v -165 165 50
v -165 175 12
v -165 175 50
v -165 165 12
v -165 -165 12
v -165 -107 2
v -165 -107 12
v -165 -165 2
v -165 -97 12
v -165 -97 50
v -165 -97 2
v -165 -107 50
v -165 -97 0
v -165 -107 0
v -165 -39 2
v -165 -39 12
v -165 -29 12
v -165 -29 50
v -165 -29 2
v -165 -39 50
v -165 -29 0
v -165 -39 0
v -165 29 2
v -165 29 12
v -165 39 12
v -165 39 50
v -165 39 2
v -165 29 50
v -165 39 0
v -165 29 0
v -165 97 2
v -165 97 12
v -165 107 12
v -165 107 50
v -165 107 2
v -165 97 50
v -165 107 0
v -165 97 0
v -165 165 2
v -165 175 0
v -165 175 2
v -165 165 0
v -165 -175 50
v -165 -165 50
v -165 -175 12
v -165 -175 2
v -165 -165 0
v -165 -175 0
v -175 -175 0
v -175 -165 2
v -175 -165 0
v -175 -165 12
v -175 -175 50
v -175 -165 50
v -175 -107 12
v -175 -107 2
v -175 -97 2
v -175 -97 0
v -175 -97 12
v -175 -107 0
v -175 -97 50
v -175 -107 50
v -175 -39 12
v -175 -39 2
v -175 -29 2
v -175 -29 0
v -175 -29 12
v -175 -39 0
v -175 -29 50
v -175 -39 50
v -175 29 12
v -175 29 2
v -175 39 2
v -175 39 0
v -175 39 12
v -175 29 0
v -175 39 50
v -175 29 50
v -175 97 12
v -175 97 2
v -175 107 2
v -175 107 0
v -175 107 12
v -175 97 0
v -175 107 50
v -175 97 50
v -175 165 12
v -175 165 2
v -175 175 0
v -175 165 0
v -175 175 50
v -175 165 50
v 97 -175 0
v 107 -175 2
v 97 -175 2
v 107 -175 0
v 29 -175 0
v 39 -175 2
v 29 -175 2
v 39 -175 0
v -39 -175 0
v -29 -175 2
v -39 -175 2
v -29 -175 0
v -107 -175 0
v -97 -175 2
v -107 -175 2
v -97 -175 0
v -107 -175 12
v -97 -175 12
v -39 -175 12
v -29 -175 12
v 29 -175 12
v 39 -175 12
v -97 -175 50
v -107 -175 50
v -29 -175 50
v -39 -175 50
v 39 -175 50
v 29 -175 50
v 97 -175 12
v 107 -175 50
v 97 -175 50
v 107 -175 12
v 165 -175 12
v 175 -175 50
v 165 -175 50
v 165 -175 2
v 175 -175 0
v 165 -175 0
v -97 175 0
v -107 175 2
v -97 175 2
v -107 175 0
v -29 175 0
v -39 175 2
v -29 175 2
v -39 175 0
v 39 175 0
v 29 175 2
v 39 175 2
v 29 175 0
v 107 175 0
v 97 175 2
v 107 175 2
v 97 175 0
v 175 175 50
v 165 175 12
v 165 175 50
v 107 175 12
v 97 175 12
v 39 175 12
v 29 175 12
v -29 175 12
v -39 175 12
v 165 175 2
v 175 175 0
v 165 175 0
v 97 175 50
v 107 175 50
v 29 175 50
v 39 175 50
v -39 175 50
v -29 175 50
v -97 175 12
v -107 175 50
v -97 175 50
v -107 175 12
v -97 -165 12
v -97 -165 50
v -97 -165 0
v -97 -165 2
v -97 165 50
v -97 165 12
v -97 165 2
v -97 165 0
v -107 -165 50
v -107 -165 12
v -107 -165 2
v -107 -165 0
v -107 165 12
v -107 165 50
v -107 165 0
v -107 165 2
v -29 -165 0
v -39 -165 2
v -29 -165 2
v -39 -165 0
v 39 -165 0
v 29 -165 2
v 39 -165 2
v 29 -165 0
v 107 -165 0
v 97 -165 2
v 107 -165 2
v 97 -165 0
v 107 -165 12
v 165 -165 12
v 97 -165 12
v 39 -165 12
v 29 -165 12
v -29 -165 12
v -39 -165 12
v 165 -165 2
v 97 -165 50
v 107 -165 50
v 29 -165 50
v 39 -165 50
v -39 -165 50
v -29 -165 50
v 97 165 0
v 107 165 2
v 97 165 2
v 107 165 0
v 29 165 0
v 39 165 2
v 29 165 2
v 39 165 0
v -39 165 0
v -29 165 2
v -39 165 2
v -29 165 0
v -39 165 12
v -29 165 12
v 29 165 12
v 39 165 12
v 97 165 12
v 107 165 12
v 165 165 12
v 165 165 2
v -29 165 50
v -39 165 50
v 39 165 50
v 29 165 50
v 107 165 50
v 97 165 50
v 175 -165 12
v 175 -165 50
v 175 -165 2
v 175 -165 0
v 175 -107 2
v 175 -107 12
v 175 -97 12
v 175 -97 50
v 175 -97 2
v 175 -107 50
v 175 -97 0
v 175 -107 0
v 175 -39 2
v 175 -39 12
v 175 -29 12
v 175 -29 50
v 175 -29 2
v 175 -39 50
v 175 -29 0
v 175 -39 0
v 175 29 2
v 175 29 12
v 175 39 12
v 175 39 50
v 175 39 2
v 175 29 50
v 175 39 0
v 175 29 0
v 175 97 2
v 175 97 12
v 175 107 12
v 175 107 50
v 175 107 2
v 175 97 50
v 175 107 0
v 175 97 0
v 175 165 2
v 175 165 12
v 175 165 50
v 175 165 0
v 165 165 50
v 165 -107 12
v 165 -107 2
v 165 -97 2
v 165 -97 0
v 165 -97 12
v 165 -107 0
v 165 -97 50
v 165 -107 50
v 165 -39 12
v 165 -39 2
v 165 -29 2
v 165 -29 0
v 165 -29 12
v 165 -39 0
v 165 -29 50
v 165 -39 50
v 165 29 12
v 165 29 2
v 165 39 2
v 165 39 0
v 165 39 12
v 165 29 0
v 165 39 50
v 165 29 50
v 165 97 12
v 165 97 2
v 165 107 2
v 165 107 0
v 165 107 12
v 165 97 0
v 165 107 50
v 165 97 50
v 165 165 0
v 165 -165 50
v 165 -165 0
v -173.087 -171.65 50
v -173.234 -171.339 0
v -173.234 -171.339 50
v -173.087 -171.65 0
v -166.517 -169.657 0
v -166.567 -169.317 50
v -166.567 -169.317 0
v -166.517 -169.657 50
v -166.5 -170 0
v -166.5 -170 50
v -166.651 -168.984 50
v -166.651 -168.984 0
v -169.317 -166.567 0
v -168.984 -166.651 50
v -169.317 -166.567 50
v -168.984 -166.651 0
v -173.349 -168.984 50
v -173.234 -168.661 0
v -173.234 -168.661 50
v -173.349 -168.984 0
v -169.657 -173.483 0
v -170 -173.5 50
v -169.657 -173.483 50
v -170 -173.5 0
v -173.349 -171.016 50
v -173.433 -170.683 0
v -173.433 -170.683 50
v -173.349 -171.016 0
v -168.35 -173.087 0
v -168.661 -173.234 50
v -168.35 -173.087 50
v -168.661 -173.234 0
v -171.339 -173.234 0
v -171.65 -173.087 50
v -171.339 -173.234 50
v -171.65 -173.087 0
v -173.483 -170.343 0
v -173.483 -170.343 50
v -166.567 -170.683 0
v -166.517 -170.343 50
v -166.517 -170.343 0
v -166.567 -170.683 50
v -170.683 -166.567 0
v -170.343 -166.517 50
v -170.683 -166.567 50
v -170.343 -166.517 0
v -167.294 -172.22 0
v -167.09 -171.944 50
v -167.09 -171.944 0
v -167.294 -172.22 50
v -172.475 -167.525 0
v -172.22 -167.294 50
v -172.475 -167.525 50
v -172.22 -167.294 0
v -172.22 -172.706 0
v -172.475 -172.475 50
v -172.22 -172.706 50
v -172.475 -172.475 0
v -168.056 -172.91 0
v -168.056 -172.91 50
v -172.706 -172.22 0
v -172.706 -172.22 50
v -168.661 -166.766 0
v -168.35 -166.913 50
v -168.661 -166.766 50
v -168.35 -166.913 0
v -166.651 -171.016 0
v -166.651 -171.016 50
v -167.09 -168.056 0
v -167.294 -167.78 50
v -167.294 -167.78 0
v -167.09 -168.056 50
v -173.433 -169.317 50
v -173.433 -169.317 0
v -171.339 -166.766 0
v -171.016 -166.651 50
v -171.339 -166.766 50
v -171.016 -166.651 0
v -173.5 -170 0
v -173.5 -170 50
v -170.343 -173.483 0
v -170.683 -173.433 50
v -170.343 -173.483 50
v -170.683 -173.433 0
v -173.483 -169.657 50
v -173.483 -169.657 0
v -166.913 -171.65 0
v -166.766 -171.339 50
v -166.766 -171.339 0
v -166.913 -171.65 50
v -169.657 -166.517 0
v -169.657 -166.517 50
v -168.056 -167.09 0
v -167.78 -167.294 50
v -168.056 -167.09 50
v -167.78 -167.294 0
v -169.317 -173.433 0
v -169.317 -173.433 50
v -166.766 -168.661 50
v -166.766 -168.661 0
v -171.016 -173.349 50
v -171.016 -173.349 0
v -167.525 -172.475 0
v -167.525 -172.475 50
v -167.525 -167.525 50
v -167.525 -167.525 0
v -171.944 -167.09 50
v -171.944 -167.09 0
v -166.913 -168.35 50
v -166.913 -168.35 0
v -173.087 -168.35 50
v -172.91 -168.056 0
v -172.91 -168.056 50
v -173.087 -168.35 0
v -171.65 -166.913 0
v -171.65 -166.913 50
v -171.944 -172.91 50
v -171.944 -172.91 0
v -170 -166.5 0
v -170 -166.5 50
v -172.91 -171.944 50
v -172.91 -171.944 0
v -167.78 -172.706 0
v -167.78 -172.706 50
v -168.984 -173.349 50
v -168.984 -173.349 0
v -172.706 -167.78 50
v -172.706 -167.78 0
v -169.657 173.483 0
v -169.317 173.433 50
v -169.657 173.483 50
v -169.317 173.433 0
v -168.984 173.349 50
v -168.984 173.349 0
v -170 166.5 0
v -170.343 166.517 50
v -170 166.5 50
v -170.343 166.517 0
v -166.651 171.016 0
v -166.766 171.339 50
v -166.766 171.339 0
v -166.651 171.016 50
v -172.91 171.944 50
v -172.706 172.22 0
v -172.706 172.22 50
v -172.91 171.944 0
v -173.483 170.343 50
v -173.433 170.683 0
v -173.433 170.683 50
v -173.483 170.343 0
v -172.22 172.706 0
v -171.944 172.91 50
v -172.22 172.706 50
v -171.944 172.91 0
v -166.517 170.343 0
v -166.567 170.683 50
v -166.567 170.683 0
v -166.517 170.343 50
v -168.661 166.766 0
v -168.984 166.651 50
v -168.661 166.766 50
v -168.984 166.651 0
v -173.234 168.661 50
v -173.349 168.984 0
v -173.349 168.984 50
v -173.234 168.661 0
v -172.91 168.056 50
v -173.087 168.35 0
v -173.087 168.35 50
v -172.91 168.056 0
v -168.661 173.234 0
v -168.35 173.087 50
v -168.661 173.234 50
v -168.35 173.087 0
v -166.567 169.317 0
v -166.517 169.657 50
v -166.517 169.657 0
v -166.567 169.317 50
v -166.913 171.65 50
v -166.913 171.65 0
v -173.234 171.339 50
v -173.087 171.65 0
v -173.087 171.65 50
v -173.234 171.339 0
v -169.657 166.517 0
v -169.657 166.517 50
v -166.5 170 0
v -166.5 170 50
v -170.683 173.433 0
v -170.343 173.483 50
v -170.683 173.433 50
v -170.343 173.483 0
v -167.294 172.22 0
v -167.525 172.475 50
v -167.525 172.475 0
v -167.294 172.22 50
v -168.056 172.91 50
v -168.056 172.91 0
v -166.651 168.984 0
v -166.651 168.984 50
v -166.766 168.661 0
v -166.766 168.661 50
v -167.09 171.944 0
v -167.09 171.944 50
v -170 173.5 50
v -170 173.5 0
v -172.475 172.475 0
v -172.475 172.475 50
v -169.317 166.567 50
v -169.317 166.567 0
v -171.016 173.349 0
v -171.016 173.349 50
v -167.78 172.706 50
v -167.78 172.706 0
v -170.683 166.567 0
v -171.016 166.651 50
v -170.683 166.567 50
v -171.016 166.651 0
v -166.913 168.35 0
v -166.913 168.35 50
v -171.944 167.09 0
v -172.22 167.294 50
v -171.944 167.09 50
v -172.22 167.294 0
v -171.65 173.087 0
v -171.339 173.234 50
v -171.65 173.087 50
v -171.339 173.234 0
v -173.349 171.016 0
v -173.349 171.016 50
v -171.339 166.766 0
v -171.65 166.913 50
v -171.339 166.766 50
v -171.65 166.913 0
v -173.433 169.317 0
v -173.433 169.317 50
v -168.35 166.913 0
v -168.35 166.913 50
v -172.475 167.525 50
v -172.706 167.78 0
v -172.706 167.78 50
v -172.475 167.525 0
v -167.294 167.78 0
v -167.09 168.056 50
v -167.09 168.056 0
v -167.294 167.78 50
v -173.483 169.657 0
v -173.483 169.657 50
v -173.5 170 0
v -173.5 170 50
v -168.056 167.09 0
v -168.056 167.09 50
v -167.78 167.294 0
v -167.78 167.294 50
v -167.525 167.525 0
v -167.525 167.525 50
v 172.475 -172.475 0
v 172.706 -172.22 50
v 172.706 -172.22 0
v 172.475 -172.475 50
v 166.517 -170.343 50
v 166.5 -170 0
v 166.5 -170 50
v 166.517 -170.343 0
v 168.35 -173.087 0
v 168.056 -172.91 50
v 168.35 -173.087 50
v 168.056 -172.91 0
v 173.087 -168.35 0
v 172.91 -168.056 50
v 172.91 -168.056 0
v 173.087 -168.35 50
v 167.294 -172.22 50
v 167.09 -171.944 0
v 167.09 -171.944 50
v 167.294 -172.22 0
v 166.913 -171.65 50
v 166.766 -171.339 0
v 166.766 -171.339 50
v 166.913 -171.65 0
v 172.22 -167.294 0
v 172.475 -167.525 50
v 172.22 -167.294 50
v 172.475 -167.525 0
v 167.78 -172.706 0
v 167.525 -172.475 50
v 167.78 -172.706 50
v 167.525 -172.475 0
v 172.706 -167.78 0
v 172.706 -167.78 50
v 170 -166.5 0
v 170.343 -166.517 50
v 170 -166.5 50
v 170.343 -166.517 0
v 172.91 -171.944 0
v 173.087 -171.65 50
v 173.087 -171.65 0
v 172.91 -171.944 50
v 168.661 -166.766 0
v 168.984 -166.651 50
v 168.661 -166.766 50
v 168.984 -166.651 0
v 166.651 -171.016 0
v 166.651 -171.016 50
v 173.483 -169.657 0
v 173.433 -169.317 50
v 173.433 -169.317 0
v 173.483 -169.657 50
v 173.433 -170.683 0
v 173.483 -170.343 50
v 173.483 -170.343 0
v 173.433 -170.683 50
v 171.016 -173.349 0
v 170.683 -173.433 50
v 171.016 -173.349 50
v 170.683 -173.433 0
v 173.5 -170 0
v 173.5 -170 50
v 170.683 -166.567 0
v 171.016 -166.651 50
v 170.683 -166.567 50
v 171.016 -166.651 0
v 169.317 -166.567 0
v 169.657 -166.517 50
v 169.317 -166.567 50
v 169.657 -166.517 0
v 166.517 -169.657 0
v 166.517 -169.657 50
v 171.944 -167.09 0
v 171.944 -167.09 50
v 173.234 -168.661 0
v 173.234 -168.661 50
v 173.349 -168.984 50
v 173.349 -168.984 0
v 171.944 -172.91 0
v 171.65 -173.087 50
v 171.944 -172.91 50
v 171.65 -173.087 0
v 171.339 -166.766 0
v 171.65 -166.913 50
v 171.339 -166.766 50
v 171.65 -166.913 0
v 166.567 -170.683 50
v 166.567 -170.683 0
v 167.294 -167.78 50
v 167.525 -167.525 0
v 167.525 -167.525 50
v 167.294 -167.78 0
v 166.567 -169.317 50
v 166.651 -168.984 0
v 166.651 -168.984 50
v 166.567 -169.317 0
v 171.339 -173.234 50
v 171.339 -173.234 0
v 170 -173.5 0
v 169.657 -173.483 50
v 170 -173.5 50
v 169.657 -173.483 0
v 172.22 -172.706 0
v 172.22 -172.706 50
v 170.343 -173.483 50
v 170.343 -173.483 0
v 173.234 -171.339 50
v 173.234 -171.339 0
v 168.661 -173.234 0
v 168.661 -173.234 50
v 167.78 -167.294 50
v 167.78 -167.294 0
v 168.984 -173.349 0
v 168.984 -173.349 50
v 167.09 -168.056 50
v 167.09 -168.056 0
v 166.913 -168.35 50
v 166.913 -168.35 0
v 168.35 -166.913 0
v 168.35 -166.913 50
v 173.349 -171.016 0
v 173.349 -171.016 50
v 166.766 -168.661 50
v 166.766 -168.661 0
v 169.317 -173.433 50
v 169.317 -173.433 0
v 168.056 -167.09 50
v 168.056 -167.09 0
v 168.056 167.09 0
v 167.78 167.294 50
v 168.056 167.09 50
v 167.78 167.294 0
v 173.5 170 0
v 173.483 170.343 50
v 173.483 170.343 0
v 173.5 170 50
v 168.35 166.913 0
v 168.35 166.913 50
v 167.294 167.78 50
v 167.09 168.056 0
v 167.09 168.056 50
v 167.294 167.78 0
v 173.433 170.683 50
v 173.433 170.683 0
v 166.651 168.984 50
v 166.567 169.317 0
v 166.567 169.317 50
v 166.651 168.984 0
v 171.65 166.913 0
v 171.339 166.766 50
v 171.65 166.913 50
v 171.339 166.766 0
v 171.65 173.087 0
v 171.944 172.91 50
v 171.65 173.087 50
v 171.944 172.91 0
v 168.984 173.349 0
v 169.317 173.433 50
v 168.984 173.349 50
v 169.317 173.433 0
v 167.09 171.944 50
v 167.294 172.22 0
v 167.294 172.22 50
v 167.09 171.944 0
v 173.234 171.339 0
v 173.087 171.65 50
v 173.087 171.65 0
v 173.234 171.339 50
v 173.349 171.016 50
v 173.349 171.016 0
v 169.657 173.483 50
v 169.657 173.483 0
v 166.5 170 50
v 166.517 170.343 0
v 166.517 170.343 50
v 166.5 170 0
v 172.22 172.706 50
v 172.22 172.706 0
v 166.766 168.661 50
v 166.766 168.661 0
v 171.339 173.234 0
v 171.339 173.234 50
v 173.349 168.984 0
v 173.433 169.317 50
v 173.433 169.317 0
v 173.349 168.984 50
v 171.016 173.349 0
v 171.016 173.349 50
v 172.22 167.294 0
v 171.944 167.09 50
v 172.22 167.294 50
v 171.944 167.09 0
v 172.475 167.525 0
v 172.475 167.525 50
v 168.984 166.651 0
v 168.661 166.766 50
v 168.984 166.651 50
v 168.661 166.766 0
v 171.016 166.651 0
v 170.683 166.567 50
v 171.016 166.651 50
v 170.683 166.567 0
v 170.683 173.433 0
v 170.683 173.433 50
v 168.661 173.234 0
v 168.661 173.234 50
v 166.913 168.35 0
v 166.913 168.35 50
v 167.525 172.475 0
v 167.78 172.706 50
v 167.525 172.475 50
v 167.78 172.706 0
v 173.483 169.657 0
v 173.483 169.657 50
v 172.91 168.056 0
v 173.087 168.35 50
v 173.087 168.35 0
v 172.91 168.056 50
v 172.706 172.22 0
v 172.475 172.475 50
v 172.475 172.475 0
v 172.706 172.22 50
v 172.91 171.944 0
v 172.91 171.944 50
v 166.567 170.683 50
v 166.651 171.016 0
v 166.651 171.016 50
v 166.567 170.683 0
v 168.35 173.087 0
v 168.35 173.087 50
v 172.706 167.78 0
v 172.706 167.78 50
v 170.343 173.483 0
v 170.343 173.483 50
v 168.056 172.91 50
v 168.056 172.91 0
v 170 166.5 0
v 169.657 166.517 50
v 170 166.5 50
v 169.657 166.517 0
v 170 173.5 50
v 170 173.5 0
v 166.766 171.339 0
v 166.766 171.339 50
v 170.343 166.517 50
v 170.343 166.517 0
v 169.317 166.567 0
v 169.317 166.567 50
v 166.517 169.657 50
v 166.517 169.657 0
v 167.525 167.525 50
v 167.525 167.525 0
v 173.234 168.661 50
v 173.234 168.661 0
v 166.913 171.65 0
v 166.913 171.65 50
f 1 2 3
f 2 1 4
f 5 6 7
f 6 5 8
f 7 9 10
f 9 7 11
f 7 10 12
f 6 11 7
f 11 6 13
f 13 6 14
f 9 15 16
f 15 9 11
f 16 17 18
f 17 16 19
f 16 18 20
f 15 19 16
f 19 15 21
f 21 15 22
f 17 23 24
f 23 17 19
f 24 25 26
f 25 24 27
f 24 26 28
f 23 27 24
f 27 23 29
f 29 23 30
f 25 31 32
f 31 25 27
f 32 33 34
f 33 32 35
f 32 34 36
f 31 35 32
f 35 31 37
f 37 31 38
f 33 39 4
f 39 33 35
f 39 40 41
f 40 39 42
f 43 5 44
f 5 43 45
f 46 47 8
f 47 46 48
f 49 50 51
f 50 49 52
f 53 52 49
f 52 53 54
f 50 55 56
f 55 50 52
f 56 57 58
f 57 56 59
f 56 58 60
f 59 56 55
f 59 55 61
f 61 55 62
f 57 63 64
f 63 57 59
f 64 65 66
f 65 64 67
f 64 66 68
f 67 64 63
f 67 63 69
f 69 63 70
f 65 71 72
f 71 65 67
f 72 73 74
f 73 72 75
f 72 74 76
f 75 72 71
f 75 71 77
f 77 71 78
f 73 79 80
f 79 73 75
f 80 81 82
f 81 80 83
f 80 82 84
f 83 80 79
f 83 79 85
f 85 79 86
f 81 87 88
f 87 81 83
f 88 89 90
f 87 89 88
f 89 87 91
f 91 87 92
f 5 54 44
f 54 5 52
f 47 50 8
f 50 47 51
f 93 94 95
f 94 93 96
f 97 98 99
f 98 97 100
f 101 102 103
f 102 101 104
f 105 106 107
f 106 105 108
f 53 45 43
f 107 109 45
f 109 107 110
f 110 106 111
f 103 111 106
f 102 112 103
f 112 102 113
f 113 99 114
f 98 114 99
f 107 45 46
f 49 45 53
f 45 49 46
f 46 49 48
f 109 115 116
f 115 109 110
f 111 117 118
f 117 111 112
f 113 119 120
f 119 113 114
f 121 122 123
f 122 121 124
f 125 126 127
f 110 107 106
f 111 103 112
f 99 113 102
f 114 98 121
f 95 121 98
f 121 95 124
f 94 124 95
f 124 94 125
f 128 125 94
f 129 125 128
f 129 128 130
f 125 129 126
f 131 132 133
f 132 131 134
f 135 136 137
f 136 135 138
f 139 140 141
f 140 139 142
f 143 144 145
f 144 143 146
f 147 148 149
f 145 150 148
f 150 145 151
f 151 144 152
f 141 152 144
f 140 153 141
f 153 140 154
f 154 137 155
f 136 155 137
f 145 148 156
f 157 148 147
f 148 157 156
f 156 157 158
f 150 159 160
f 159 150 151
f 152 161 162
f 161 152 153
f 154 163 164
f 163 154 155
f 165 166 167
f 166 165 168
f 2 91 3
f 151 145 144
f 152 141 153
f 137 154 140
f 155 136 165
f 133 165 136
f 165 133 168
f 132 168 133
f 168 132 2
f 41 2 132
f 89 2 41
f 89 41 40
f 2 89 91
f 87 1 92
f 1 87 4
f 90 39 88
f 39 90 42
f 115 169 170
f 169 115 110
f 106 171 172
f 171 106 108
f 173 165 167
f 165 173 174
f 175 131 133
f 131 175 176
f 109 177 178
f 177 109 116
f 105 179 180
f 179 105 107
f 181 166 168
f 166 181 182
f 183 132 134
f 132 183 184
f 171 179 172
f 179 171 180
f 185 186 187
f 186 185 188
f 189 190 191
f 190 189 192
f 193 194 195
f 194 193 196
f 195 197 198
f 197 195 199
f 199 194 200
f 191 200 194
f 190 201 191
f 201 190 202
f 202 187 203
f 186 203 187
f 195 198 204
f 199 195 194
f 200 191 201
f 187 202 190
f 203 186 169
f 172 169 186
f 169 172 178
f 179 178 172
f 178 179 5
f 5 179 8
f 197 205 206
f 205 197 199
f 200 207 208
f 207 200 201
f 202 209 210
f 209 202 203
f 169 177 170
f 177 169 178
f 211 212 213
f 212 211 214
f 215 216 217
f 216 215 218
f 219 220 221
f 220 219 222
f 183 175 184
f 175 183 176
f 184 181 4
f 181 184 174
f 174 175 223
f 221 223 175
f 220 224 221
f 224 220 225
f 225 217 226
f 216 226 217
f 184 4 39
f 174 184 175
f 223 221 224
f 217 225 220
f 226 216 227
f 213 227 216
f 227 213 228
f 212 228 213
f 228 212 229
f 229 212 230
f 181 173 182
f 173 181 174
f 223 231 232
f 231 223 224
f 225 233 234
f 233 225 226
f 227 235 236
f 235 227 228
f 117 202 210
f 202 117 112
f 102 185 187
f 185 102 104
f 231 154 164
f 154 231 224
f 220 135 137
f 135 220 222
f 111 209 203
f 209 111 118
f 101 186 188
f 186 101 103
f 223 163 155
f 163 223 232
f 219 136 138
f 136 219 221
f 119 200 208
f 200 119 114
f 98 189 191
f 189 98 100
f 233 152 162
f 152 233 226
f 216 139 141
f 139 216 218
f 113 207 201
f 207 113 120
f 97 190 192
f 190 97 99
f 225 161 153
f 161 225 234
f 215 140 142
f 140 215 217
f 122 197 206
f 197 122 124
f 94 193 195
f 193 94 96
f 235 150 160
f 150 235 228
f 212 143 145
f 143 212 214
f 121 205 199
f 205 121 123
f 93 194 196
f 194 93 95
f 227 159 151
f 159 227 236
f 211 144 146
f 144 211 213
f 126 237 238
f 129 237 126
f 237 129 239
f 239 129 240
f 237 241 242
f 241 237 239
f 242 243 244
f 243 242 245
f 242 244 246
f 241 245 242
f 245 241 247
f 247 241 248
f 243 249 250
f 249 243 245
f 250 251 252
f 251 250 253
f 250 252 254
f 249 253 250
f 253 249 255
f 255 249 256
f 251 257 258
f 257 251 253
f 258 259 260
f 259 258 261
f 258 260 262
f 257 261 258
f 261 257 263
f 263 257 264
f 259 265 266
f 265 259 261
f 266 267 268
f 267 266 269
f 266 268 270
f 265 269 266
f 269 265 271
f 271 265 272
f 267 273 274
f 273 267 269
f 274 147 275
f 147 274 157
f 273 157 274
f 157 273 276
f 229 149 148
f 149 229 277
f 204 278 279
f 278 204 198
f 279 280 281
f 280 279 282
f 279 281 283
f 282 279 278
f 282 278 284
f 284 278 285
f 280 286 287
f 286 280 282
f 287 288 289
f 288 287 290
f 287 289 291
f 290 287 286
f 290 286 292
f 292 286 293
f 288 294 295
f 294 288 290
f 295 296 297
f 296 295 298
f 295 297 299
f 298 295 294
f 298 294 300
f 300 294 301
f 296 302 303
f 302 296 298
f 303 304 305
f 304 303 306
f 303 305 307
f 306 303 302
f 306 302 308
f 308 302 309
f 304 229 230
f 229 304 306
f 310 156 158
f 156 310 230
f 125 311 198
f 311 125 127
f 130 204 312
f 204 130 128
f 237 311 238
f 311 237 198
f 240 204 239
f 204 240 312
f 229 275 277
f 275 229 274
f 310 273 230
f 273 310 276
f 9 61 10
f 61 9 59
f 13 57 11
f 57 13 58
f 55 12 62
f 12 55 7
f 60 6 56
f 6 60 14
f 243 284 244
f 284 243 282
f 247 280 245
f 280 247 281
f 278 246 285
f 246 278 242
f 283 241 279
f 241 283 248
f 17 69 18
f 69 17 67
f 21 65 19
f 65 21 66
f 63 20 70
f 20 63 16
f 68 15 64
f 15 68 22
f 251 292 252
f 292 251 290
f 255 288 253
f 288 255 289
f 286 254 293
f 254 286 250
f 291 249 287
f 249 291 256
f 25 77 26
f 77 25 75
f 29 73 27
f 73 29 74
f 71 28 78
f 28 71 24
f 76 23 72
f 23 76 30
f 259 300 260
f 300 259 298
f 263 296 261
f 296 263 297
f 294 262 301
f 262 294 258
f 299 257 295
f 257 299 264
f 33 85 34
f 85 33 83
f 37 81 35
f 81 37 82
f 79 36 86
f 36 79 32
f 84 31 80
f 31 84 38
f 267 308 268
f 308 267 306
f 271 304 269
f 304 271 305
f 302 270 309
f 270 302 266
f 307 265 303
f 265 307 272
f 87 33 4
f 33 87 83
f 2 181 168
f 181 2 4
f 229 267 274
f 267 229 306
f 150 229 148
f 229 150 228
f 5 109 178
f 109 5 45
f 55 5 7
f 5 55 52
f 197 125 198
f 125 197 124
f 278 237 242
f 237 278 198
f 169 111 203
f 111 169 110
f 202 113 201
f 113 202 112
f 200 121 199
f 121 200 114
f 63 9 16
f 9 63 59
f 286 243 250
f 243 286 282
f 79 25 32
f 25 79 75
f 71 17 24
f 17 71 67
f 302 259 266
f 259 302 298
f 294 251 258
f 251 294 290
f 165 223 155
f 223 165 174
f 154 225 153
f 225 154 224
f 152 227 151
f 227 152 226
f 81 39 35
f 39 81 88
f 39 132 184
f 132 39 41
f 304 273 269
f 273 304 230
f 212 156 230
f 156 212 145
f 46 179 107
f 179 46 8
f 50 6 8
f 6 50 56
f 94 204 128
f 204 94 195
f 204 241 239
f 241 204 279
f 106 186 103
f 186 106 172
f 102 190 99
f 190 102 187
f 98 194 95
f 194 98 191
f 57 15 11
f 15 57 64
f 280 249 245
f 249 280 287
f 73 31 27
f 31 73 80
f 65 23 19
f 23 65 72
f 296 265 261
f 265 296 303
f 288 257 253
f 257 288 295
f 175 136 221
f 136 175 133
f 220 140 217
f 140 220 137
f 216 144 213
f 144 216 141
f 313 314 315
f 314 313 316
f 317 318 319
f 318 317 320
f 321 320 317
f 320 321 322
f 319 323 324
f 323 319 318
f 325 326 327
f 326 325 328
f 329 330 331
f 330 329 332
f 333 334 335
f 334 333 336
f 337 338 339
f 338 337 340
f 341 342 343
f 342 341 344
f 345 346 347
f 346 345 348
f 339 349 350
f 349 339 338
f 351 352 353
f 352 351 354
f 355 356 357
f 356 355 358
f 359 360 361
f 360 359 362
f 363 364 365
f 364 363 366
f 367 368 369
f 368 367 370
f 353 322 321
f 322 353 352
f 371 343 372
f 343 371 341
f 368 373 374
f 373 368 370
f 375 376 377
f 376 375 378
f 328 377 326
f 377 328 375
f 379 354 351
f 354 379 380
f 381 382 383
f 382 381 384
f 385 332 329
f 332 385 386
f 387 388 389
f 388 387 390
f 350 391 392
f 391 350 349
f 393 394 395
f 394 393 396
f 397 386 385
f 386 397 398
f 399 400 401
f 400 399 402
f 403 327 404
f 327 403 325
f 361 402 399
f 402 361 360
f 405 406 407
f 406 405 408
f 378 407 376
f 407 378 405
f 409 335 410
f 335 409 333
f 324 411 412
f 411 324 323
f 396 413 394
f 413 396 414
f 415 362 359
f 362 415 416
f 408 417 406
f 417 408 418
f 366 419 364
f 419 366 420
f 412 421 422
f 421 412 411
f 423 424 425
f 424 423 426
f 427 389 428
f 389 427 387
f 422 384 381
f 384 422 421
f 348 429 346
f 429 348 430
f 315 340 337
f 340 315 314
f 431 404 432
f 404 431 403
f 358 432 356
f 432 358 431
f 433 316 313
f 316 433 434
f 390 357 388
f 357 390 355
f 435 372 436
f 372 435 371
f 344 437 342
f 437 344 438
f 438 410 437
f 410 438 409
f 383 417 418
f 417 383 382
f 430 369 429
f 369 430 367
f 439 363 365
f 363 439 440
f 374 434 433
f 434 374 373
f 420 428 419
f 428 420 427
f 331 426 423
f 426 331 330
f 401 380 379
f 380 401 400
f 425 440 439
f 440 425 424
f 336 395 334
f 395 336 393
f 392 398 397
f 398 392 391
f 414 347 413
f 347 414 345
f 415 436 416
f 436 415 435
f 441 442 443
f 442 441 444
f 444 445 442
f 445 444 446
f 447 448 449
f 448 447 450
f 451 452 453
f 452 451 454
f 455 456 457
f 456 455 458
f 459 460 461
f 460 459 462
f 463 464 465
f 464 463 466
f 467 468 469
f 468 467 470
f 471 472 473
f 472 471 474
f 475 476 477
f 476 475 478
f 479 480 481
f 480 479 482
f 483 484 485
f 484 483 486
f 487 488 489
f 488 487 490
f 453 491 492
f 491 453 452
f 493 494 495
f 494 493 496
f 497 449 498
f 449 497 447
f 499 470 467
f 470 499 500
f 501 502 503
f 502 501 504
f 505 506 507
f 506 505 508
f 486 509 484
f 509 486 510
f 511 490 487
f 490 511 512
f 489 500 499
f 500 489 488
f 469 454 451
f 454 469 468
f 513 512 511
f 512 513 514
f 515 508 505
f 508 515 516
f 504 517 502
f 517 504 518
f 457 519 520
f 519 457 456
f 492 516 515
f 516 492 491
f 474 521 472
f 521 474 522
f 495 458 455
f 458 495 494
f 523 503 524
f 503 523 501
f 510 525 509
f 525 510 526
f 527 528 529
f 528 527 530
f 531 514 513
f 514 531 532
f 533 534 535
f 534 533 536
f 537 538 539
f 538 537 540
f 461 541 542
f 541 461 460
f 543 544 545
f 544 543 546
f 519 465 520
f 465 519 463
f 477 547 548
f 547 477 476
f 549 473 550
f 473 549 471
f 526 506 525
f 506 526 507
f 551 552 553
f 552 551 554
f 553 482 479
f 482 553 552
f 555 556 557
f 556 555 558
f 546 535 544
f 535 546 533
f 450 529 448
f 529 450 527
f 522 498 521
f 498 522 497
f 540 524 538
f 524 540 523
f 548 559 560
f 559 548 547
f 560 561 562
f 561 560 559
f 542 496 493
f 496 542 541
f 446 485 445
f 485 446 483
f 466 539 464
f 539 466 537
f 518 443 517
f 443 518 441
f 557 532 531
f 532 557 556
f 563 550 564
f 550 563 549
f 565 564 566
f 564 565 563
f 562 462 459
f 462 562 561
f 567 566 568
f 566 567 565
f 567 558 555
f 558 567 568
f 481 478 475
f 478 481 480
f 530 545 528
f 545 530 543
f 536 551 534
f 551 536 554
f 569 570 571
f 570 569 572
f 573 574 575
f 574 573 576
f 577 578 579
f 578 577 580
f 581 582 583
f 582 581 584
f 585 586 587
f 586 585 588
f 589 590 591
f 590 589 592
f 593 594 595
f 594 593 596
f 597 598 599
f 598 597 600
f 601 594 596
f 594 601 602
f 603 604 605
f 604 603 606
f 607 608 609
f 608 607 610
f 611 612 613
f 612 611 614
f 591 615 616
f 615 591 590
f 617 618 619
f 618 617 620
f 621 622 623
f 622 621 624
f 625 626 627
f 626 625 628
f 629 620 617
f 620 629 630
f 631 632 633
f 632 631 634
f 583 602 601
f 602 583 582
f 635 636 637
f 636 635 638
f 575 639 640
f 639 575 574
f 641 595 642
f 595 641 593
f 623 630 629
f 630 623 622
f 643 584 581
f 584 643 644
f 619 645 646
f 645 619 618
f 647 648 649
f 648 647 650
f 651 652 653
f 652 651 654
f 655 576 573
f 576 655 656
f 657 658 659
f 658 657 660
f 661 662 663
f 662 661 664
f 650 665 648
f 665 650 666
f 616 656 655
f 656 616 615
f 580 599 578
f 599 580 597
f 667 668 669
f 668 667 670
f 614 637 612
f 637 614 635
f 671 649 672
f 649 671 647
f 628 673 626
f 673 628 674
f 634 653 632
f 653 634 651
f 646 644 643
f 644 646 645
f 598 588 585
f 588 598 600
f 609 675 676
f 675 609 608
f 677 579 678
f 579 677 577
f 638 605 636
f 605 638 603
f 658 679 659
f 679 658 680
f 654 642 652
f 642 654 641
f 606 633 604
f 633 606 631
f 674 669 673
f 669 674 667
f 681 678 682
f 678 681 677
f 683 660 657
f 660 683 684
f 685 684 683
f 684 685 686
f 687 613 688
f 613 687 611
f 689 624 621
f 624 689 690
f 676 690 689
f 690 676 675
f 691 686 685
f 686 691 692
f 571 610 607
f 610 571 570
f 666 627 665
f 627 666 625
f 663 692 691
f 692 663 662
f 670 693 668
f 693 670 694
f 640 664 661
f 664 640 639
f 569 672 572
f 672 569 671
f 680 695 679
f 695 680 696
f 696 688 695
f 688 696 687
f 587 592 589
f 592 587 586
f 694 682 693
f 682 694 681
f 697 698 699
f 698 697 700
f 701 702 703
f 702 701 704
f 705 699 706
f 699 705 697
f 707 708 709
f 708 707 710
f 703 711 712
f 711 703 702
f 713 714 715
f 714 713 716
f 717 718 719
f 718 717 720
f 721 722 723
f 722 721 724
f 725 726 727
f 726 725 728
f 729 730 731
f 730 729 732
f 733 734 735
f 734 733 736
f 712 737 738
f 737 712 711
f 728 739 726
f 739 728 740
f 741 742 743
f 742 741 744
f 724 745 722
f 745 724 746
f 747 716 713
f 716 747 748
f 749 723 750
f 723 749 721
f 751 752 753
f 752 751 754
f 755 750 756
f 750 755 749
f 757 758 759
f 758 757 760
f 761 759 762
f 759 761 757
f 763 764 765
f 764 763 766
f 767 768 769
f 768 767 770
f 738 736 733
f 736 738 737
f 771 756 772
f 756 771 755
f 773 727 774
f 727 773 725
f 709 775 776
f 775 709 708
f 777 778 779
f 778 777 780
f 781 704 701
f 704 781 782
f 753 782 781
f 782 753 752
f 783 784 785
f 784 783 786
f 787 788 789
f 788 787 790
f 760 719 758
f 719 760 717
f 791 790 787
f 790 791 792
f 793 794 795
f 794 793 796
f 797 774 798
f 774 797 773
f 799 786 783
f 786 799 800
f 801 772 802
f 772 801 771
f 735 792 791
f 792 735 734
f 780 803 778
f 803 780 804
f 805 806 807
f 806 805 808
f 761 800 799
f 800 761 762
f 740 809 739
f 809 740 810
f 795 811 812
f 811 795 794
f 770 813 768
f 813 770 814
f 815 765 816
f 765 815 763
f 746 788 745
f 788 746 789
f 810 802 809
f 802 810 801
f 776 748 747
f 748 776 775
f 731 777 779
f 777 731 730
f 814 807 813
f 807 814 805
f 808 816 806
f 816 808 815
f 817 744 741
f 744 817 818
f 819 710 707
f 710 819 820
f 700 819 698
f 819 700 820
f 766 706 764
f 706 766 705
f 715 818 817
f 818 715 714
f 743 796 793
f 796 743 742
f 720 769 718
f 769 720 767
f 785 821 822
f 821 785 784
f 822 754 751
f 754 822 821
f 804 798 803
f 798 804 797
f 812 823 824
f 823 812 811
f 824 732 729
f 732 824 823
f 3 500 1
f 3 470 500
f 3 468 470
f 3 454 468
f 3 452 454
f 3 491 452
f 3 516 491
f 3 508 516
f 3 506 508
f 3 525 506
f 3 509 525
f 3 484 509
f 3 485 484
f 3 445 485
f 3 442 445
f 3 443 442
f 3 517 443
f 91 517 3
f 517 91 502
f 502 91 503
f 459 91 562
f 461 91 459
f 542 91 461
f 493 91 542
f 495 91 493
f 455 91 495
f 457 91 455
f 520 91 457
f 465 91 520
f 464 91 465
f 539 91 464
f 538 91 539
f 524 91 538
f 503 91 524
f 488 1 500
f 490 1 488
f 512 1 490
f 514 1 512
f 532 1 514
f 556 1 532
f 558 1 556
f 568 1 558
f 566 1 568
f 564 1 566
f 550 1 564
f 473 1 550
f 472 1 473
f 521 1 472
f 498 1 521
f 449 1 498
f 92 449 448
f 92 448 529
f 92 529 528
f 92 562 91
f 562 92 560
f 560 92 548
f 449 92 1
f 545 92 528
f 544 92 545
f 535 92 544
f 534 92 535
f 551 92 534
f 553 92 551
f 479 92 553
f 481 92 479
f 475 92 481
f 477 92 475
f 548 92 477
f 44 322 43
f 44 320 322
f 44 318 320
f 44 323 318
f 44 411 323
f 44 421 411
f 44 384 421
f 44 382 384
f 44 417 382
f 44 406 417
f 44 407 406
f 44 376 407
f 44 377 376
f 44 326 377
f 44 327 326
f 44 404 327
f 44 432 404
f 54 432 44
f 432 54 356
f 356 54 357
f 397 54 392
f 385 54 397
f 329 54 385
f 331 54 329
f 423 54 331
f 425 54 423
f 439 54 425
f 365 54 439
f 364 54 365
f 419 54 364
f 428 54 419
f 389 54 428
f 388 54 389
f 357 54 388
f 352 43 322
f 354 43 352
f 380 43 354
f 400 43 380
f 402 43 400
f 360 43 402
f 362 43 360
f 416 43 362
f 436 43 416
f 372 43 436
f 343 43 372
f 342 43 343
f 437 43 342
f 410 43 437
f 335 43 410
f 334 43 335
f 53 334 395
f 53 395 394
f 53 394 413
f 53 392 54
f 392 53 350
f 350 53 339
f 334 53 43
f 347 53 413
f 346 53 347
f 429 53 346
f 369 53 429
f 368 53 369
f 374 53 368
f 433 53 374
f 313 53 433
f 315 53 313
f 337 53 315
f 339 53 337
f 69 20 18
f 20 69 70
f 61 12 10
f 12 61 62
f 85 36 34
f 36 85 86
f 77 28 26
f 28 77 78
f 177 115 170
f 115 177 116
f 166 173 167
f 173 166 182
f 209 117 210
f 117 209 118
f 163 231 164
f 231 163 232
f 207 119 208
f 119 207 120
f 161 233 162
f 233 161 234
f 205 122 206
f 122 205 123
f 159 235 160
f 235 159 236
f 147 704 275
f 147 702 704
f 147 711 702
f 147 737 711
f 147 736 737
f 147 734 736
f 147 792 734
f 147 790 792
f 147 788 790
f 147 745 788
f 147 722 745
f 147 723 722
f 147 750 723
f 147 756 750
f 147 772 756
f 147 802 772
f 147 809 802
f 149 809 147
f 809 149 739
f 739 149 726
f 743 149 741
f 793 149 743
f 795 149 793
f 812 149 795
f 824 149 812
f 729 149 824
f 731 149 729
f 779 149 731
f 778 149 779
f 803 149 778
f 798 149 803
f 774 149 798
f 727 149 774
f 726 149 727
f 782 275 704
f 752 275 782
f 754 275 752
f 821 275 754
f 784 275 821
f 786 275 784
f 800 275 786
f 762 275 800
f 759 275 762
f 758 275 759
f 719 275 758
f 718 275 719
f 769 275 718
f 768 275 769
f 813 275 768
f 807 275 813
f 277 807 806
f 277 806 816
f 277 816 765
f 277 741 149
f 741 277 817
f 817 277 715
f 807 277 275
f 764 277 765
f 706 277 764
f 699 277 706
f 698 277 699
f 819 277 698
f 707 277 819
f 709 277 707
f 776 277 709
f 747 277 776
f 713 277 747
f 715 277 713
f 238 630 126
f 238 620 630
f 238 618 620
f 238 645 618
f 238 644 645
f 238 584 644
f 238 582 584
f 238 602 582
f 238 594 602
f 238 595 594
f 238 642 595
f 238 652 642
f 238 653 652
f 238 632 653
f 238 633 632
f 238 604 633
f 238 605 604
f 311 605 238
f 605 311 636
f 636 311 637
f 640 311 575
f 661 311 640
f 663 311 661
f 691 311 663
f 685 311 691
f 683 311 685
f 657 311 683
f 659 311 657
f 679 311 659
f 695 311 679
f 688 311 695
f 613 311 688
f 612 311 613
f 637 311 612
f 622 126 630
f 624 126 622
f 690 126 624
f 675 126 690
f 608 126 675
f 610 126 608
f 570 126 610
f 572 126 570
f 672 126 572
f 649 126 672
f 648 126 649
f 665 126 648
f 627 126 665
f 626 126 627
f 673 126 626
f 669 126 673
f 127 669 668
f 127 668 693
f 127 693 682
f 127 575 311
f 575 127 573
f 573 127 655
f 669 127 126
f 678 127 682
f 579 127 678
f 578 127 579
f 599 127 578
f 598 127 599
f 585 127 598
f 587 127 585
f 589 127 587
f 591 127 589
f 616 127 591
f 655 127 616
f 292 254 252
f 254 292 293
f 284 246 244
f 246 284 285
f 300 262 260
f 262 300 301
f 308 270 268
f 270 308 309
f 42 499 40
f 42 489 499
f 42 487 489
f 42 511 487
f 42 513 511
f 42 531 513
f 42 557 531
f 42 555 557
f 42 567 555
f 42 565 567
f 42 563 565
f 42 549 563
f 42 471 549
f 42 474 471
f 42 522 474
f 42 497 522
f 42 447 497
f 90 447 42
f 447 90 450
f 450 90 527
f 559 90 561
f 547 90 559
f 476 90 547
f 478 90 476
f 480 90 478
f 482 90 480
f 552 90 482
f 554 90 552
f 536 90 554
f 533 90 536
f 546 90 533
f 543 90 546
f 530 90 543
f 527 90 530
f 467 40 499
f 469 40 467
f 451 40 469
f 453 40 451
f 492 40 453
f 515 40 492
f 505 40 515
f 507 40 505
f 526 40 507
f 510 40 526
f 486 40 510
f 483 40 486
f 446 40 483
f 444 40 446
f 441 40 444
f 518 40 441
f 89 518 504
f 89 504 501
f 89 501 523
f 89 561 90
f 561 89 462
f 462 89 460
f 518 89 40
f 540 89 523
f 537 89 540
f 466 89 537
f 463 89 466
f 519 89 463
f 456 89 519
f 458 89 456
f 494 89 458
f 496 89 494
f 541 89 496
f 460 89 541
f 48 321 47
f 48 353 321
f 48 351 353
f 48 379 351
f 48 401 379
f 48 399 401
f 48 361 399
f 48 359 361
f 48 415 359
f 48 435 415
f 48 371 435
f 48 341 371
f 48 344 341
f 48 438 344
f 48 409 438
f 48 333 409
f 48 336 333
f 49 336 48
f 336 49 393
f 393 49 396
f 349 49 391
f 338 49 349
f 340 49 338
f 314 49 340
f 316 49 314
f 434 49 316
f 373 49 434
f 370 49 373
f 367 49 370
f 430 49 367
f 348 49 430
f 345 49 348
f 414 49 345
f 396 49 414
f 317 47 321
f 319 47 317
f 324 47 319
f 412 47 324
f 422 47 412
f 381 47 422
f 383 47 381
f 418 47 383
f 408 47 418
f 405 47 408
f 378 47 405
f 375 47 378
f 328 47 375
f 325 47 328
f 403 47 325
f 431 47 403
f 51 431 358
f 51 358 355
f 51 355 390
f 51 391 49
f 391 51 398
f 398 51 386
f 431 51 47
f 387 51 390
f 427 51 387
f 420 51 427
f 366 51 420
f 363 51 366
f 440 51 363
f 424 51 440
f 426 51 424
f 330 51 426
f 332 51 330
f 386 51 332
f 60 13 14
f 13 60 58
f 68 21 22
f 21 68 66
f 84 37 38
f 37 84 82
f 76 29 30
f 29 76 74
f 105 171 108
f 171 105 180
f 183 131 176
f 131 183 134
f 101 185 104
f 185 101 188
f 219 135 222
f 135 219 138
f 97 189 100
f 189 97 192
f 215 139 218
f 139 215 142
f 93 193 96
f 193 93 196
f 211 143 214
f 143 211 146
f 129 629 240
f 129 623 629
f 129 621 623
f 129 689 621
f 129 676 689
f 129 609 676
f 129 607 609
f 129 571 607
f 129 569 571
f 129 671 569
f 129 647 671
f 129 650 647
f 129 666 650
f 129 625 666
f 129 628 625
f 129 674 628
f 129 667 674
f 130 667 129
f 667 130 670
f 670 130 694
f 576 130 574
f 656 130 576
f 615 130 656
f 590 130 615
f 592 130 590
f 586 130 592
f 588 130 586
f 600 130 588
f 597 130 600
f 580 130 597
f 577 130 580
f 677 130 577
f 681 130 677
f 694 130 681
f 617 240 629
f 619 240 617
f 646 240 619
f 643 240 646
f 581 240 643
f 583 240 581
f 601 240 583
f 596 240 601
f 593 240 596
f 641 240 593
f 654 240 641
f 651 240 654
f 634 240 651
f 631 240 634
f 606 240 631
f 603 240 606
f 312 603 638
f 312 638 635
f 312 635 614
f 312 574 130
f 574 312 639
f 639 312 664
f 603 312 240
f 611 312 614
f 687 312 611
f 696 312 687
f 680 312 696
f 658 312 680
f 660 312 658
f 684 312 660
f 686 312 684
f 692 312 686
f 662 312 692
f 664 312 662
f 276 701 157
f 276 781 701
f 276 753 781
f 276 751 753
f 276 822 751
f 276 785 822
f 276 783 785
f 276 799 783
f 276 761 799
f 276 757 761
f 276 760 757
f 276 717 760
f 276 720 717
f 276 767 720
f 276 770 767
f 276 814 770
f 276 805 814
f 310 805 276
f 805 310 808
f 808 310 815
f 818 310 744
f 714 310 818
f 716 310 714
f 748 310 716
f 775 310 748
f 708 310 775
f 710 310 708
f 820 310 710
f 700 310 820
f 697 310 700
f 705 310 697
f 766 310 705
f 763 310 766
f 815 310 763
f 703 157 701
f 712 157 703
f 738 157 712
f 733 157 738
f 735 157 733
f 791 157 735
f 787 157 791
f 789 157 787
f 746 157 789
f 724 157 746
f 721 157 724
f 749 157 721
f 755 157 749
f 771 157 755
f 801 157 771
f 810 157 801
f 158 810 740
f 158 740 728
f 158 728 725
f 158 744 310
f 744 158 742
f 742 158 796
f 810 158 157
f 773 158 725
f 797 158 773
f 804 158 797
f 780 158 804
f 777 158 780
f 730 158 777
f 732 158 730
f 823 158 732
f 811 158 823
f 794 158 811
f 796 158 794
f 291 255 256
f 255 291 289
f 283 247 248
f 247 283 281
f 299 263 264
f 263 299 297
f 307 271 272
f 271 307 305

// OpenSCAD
// Cage slice - index 11
bar = 10;
outer = 350;
half = outer / 2;
height = 700;

N_xy = 6;
N_z  = 11;

x_spacing = (outer - bar) / (N_xy - 1);
z_spacing = (height - bar) / (N_z  - 1);

xs = [ for (i = [0 : N_xy - 1]) (-half + bar/2 + i * x_spacing) ];
ys = xs;

zs = [ for (k = [0 : N_z - 1]) (bar/2 + k * z_spacing) ];

$fn = 64;

module cage_bars() {
    union() {
        // Vertical bars on front and back faces
        for (xv = xs) {
            translate([xv, -half + bar/2, height/2])
                cube([bar, bar, height], center = true);
            translate([xv,  half - bar/2, height/2])
                cube([bar, bar, height], center = true);
        }

        // Vertical bars on left and right faces
        for (yv = ys) {
            translate([-half + bar/2, yv, height/2])
                cube([bar, bar, height], center = true);
            translate([ half - bar/2, yv, height/2])
                cube([bar, bar, height], center = true);
        }

        // Horizontal x-bars on front and back faces
        for (zv = zs) {
            translate([0, -half + bar/2, zv])
                cube([outer, bar, bar], center = true);
            translate([0,  half - bar/2, zv])
                cube([outer, bar, bar], center = true);
        }

        // Horizontal y-bars on left and right faces
        for (zv = zs) {
            translate([-half + bar/2, 0, zv])
                cube([bar, outer, bar], center = true);
            translate([ half - bar/2, 0, zv])
                cube([bar, outer, bar], center = true);
        }

        // Floor and ceiling extra x-bars at all y positions
        z_floor = bar/2;
        z_ceil  = height - bar/2;
        for (yv = ys) {
            translate([0, yv, z_floor])
                cube([outer, bar, bar], center = true);
            translate([0, yv, z_ceil])
                cube([outer, bar, bar], center = true);
        }

        // Floor and ceiling extra y-bars at all x positions
        for (xv = xs) {
            translate([xv, 0, z_floor])
                cube([bar, outer, bar], center = true);
            translate([xv, 0, z_ceil])
                cube([bar, outer, bar], center = true);
        }
    }
}

module corner_holes() {
    hole_d = 7;
    for (sx = [-1, 1])
        for (sy = [-1, 1])
            translate([sx * (half - bar/2), sy * (half - bar/2), height/2])
                cylinder(h = height + 2, d = hole_d, center = true);
}

module cage_full() {
    difference() {
        cage_bars();
        corner_holes();
    }
}

slice_index = 11;
slice_height = 50;

module cage_slice() {
    translate([0, 0, -slice_index * slice_height]) {
        intersection() {
            cage_full();
            translate([0, 0, slice_index * slice_height + slice_height/2])
                cube([outer + 20, outer + 20, slice_height], center = true);
        }
    }
}

cage_slice();
